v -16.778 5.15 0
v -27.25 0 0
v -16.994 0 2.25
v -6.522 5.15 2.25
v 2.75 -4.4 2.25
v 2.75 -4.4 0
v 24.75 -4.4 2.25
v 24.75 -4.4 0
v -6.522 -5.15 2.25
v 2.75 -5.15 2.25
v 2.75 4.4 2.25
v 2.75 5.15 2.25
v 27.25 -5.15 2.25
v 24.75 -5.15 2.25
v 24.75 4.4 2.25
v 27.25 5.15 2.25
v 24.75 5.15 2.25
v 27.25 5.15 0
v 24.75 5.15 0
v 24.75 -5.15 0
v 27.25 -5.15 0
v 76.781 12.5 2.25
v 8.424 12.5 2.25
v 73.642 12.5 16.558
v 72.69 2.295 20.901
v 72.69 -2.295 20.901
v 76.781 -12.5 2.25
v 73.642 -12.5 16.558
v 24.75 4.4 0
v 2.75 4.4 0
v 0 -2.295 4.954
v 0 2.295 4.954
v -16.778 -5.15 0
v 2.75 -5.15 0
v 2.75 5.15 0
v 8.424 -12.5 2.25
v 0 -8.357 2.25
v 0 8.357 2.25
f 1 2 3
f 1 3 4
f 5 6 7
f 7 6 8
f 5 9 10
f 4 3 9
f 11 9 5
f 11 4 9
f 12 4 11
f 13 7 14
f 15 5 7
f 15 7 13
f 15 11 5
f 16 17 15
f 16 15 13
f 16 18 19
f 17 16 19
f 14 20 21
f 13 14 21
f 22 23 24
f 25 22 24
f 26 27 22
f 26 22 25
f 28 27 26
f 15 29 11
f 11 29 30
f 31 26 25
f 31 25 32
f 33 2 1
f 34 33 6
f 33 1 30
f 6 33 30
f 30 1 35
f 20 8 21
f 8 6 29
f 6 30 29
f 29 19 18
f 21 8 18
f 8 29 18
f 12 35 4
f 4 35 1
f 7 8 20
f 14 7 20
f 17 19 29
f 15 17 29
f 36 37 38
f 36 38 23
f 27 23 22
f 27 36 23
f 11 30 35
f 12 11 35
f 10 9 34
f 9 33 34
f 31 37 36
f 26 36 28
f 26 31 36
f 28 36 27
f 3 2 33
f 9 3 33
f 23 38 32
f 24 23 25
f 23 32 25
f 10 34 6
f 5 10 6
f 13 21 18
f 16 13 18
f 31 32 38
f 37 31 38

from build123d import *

# Parameters (mm, degrees)
F1_DEPTH  = 2.25
F3_DEPTH  = 12.5
F7_DEPTH  = 25
F11_DEPTH = 12.5
F13_DEPTH = 25


with BuildPart() as f1:
    # F0 (on Top) → F1 (new body)
    with BuildSketch(Plane.XY):
        Polygon((24.75, -5.15), (27.25, -5.15), (27.25, 5.15), (24.75, 5.15), (24.75, 4.4), (2.75, 4.4), (2.75, 5.15), (-27.25, 5.15), (-27.25, -5.15), (2.75, -5.15), (2.75, -4.4), (24.75, -4.4), align=None)
    extrude(amount=F1_DEPTH)

    # F2 (on Front) → F3 (cut, symmetric)
    with BuildSketch(Plane.XZ):
        Polygon((-27.25, 0), (-16.9939042516, 2.25), (-27.25, 2.25), align=None)
    extrude(amount=F3_DEPTH, both=True, mode=Mode.SUBTRACT)


with BuildPart() as f7:
    # F6 (on 3pt) → F7 (new body)
    with BuildSketch(Plane(origin=(-1.051611932, -2.1383754437, 4.7935256286), x_dir=(0.9805145264, -0.0800319539, 0.1794049886), z_dir=(-0.1964465921, -0.3994596826, 0.8954555815))):
        Polygon((-16.2591087544, 0.9166455588), (-26.7190208438, 0), (-16.0387651474, -4.7032411254), (-5.578853058, -3.7865955666), align=None)
        Polygon((-37.5846625228, 4.78487915), (-26.7190208438, 0), (-16.2591087544, 0.9166455588), (-27.1247504333, 5.7015247088), align=None)
        Polygon((-16.0387651474, -4.7032411254), (-26.7190208438, 0), (-37.5846625228, 4.78487915), (-43.2418280355, -7.0871585589), align=None)
    extrude(amount=F7_DEPTH)


with BuildPart() as f8_1:
    # F8: instance of F7
    add(f7.part.mirror(Plane.XZ))


with BuildPart() as f1_1:
    add(f1.part)

    # F9: cut F7, F8_1
    add(f7.part, mode=Mode.SUBTRACT)
    add(f8_1.part, mode=Mode.SUBTRACT)


with BuildPart() as f11:
    # F10 (on Front) → F11 (new body, symmetric)
    with BuildSketch(Plane.XZ):
        Polygon((72.689631743, 20.9011476375), (0, 4.9543706735), (0, 2.25), (76.7813527267, 2.25), align=None)
    extrude(amount=F11_DEPTH, both=True)


with BuildPart() as f13:
    # F12 (on face) → F13 (new body)
    with BuildSketch(Plane(origin=(-1.051611932, -2.1383754437, 4.7935256286), x_dir=(0.9805145264, -0.0800319539, 0.1794049886), z_dir=(-0.1964465921, -0.3994596826, 0.8954555815))):
        Polygon((-26.7190208438, 0), (-16.2591087544, 0.9166455588), (-5.578853058, -3.7865955666), (-16.0387651474, -4.7032411254), (83.7536636937, -48.6486174044), (103.4110658877, -4.0100211344), (-14.3110548824, 47.8310148406), (-33.9684570764, 3.1924185707), align=None)
    extrude(amount=F13_DEPTH)


with BuildPart() as f14_1:
    # F14: instance of F13
    add(f13.part.mirror(Plane.XZ))


with BuildPart() as f11_1:
    add(f11.part)

    # F15: cut F14_1, F13
    add(f14_1.part, mode=Mode.SUBTRACT)
    add(f13.part, mode=Mode.SUBTRACT)


solid = Compound([f1_1.part, f11_1.part])
